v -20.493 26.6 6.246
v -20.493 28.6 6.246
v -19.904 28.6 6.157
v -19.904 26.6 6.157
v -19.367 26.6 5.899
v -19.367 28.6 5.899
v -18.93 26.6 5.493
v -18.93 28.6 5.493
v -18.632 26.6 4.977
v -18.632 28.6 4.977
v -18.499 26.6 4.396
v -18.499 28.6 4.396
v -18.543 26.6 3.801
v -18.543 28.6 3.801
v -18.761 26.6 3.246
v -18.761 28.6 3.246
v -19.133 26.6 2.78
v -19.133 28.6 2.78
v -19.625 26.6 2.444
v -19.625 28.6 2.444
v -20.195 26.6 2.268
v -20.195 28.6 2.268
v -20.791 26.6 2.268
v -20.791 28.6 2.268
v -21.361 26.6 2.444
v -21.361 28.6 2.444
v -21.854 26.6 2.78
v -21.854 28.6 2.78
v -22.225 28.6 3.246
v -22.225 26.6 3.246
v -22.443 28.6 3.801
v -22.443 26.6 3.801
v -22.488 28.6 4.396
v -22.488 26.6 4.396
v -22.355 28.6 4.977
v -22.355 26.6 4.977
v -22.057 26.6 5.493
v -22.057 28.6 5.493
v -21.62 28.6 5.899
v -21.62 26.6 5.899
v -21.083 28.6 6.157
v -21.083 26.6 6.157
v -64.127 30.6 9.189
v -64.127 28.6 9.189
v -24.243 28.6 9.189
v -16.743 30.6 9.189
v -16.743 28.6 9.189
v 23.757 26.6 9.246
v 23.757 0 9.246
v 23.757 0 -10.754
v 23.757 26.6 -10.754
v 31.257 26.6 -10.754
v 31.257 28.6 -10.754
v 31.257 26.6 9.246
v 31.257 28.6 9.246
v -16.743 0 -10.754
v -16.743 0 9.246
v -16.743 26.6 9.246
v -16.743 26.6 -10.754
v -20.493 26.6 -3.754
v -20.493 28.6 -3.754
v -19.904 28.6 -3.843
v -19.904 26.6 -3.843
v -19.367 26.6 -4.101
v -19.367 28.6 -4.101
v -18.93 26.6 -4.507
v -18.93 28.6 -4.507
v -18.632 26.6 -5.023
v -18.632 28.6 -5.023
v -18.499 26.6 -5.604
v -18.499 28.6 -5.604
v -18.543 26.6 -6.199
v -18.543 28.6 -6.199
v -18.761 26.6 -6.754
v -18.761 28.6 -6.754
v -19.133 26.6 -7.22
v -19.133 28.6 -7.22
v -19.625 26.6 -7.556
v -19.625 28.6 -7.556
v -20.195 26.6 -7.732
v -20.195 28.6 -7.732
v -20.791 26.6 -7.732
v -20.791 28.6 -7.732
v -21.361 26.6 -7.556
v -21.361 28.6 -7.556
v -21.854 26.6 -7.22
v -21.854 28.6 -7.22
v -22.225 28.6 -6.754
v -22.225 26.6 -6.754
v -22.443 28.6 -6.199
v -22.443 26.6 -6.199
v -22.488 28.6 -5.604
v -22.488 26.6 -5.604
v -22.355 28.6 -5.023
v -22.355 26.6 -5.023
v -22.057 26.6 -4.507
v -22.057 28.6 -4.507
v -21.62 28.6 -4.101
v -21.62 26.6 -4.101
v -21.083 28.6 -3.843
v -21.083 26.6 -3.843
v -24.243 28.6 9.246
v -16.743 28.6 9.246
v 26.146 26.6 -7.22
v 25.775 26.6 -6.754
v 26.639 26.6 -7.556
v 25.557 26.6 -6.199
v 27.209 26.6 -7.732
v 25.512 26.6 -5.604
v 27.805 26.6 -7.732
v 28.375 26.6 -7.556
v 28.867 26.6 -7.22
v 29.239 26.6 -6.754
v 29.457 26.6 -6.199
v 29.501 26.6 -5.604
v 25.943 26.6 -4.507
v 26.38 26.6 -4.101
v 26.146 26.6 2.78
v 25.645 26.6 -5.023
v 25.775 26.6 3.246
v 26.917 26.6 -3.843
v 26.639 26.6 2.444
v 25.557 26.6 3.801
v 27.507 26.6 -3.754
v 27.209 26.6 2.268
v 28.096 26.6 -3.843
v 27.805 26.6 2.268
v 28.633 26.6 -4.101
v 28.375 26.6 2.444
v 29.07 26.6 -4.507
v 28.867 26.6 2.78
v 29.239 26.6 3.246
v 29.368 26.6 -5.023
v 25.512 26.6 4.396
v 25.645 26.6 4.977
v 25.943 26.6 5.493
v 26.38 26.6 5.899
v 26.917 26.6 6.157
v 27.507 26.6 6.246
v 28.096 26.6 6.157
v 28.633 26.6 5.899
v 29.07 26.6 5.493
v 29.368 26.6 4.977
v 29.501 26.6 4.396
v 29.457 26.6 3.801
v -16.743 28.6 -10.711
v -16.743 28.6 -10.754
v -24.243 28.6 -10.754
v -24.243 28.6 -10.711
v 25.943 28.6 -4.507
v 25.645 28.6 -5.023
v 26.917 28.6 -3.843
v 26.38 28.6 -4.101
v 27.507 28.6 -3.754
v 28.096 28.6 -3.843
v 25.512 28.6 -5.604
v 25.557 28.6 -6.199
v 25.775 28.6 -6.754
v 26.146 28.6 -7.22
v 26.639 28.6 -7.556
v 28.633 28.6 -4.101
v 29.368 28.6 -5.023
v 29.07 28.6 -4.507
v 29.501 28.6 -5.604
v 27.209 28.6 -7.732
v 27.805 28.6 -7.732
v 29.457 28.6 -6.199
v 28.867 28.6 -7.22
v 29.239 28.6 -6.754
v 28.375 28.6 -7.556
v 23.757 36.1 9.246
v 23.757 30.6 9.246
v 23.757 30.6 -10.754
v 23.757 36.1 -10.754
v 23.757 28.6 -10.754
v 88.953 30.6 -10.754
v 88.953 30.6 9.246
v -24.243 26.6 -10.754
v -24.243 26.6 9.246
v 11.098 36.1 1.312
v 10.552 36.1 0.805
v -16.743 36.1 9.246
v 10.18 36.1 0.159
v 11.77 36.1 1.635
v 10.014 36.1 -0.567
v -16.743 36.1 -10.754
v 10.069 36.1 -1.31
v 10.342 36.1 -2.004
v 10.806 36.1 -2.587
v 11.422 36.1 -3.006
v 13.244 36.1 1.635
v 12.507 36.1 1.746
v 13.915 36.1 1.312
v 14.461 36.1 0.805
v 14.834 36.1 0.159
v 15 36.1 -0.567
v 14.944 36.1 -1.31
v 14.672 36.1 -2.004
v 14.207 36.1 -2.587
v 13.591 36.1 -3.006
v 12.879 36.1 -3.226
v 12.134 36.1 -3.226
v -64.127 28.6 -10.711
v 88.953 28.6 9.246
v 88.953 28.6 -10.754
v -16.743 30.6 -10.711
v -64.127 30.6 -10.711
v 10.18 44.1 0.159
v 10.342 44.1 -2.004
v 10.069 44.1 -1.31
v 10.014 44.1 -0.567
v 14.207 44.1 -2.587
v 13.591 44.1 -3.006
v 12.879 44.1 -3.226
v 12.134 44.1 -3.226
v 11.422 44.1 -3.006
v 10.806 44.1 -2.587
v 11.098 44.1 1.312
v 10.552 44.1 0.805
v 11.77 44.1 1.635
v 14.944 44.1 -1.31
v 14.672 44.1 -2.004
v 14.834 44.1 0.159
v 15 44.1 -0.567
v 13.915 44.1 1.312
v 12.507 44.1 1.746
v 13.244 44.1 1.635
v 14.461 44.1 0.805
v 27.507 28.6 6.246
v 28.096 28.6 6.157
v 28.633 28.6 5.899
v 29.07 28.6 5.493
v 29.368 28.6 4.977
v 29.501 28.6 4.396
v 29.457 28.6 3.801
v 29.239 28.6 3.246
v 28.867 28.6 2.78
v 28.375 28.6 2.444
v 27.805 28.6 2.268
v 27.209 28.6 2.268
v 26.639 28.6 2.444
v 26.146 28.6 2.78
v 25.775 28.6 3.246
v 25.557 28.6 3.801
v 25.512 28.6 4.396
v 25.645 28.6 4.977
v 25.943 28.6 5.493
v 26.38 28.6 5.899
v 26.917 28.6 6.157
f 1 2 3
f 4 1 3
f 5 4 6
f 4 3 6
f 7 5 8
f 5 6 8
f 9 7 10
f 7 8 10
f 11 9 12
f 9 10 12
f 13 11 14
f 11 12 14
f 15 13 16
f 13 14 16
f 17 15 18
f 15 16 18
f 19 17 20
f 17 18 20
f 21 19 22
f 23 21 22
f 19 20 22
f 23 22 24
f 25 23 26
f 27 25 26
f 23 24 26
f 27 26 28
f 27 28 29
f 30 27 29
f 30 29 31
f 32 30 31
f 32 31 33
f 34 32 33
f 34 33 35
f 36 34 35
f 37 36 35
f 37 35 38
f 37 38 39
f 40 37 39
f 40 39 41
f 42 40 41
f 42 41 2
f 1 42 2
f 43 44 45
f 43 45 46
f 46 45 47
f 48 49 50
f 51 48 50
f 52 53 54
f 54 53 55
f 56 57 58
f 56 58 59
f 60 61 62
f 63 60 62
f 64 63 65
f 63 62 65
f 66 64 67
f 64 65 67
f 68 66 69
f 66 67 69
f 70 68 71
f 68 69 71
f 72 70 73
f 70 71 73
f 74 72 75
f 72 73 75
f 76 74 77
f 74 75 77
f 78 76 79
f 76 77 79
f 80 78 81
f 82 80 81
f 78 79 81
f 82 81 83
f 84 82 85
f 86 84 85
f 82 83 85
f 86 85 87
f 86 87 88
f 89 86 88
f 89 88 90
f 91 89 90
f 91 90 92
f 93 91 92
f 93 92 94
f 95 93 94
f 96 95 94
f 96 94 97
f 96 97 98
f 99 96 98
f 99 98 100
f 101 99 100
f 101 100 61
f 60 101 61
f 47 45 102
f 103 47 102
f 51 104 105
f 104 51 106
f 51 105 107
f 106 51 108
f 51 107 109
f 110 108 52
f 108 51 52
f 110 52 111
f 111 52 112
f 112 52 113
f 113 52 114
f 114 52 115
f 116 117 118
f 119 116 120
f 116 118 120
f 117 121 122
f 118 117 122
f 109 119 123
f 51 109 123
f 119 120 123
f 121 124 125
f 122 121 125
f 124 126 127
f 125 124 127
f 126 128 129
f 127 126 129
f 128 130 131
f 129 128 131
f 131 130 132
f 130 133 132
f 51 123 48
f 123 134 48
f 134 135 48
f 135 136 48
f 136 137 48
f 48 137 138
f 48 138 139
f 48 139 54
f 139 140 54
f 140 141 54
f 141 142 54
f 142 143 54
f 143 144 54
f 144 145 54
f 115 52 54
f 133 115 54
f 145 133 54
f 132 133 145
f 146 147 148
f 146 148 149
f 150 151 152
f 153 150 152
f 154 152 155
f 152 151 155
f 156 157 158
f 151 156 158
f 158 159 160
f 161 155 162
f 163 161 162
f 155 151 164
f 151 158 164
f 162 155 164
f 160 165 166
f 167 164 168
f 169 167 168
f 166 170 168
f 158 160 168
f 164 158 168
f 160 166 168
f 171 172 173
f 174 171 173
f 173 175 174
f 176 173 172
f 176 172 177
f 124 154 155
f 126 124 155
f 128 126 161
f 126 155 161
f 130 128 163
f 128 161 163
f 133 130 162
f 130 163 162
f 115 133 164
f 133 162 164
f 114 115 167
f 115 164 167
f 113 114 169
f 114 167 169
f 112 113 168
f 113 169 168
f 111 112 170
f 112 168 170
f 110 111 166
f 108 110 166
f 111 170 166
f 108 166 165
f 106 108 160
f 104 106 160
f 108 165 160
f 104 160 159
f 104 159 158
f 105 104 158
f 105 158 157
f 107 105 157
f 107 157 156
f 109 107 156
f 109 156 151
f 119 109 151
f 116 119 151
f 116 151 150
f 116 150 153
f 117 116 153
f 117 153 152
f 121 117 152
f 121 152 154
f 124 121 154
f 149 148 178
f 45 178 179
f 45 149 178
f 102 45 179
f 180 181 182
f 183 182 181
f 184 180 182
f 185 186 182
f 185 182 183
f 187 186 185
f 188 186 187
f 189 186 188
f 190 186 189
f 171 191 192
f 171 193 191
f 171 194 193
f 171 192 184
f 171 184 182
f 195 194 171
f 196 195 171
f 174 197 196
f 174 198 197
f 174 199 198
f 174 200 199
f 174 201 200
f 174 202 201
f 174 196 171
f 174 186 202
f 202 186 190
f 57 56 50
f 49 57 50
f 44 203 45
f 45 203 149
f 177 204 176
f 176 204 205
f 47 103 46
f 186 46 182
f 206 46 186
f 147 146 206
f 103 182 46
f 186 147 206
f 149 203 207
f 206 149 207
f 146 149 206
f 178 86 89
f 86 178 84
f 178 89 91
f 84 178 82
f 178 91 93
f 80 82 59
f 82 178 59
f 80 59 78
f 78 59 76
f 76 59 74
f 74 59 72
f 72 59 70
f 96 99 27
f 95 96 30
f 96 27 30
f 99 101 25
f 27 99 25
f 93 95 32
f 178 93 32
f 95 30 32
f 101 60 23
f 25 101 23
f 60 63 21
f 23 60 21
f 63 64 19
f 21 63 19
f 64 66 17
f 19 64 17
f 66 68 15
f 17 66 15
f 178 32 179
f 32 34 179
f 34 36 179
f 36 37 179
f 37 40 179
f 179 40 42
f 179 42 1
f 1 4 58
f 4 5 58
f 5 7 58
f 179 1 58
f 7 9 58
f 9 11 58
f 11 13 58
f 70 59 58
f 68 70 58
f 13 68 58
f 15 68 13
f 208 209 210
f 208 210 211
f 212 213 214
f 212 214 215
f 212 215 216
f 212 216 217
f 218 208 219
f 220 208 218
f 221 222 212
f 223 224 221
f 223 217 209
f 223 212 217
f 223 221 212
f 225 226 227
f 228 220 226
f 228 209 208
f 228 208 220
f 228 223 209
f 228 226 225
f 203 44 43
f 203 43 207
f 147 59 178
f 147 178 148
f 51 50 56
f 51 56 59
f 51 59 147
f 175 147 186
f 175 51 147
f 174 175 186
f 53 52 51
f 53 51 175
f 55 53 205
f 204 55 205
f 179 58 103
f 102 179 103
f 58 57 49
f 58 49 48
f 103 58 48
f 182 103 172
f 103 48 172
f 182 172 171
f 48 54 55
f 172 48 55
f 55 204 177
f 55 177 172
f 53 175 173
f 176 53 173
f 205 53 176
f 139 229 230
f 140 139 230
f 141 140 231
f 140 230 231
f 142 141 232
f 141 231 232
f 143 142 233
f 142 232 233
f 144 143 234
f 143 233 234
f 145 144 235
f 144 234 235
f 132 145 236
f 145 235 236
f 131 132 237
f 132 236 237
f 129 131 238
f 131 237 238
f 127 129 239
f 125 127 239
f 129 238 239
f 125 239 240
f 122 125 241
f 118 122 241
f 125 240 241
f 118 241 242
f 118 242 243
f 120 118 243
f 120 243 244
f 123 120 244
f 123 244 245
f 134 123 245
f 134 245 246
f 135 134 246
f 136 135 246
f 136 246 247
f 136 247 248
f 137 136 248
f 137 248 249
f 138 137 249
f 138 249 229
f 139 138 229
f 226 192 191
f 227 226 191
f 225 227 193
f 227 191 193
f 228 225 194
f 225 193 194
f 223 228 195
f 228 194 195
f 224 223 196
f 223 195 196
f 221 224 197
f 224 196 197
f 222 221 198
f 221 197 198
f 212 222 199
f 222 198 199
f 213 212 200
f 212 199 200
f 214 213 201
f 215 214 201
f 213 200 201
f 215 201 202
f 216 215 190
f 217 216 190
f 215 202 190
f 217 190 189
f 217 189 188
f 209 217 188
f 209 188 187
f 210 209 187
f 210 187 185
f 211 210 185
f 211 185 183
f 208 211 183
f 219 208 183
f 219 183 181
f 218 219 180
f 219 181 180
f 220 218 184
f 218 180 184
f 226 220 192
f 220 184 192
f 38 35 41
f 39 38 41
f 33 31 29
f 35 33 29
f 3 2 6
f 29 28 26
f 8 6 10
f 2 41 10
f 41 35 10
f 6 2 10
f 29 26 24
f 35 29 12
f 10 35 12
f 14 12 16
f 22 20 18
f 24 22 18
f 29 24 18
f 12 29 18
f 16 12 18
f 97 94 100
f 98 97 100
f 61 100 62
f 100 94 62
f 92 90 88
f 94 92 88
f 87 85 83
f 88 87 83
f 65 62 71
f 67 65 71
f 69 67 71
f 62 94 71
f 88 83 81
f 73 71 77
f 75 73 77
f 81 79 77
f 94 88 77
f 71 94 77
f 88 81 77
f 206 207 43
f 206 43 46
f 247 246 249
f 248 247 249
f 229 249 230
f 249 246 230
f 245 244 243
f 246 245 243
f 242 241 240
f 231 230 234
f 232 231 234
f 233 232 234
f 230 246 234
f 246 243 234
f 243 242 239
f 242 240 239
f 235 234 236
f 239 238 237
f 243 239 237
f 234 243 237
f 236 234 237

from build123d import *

# Parameters (mm, degrees)
SKETCH1_W                = 40.5
SKETCH1_H                = 20
BOSS_EXTRUDE1_DEPTH      = 36.1
SKETCH2_R                = 2.5
BOSS_EXTRUDE2_DEPTH      = 8
BOSS_EXTRUDE3_DEPTH      = 7.5
BOSS_EXTRUDE3_DEPTH_BACK = 48
SKETCH3_W                = 20
SKETCH3_H                = 2
SKETCH4_R                = 2
CUT_EXTRUDE1_DEPTH       = 7.5
SKETCH5_W                = 47.383386501
SKETCH5_H                = 19.900048315
SKETCH5_W_2              = 65.196690676
SKETCH5_H_2              = 19.999647671
BOSS_EXTRUDE4_DEPTH      = 2


with BuildPart() as part:
    # Sketch1 → Boss-Extrude1 (new body)
    with BuildSketch(Plane(origin=(0, 0, 0), x_dir=(1, 0, 0), z_dir=(0, 1, 0))):
        with Locations((3.506737992, 0.753901676)):
            Rectangle(SKETCH1_W, SKETCH1_H)
    extrude(amount=BOSS_EXTRUDE1_DEPTH)

    # Sketch2 → Boss-Extrude2 (add)
    with BuildSketch(Plane(origin=(0, 36.1, 0), x_dir=(1, 0, 0), z_dir=(0, 1, 0))):
        with Locations(Location((12.506737992, 0.753901676, 0), (0, 0, 270))):
            Circle(SKETCH2_R)
    extrude(amount=BOSS_EXTRUDE2_DEPTH)

    # Sketch3 → Boss-Extrude3 (add, two sides: drawn at the far end of the back side and taken through both)
    with BuildSketch(Plane.ZY.offset(16.743262008).offset(-BOSS_EXTRUDE3_DEPTH_BACK)):
        with Locations((-0.753901676, 27.6)):
            Rectangle(SKETCH3_W, SKETCH3_H)
    extrude(amount=BOSS_EXTRUDE3_DEPTH + BOSS_EXTRUDE3_DEPTH_BACK)

    # Sketch4 → Cut-Extrude1 (cut)
    with BuildSketch(Plane(origin=(0, 28.6, 0), x_dir=(1, 0, 0), z_dir=(0, 1, 0))):
        with Locations(Location((-20.493262008, 5.753901676, 0), (0, 0, 270))):
            Circle(SKETCH4_R)
        with Locations(Location((27.506737992, 5.753901676, 0), (0, 0, 270))):
            Circle(SKETCH4_R)
        with Locations(Location((-20.493262008, -4.246098324, 0), (0, 0, 270))):
            Circle(SKETCH4_R)
        with Locations(Location((27.506737992, -4.246098324, 0), (0, 0, 270))):
            Circle(SKETCH4_R)
    extrude(amount=-CUT_EXTRUDE1_DEPTH, mode=Mode.SUBTRACT)

    # Sketch5 → Boss-Extrude4 (add)
    with BuildSketch(Plane(origin=(0, 28.6, 0), x_dir=(1, 0, 0), z_dir=(0, 1, 0))):
        with Locations((-40.434955259, 0.760670561)):
            Rectangle(SKETCH5_W, SKETCH5_H)
        with Locations((56.35508333, 0.753725511)):
            Rectangle(SKETCH5_W_2, SKETCH5_H_2)
    extrude(amount=BOSS_EXTRUDE4_DEPTH)


solid = part.part
